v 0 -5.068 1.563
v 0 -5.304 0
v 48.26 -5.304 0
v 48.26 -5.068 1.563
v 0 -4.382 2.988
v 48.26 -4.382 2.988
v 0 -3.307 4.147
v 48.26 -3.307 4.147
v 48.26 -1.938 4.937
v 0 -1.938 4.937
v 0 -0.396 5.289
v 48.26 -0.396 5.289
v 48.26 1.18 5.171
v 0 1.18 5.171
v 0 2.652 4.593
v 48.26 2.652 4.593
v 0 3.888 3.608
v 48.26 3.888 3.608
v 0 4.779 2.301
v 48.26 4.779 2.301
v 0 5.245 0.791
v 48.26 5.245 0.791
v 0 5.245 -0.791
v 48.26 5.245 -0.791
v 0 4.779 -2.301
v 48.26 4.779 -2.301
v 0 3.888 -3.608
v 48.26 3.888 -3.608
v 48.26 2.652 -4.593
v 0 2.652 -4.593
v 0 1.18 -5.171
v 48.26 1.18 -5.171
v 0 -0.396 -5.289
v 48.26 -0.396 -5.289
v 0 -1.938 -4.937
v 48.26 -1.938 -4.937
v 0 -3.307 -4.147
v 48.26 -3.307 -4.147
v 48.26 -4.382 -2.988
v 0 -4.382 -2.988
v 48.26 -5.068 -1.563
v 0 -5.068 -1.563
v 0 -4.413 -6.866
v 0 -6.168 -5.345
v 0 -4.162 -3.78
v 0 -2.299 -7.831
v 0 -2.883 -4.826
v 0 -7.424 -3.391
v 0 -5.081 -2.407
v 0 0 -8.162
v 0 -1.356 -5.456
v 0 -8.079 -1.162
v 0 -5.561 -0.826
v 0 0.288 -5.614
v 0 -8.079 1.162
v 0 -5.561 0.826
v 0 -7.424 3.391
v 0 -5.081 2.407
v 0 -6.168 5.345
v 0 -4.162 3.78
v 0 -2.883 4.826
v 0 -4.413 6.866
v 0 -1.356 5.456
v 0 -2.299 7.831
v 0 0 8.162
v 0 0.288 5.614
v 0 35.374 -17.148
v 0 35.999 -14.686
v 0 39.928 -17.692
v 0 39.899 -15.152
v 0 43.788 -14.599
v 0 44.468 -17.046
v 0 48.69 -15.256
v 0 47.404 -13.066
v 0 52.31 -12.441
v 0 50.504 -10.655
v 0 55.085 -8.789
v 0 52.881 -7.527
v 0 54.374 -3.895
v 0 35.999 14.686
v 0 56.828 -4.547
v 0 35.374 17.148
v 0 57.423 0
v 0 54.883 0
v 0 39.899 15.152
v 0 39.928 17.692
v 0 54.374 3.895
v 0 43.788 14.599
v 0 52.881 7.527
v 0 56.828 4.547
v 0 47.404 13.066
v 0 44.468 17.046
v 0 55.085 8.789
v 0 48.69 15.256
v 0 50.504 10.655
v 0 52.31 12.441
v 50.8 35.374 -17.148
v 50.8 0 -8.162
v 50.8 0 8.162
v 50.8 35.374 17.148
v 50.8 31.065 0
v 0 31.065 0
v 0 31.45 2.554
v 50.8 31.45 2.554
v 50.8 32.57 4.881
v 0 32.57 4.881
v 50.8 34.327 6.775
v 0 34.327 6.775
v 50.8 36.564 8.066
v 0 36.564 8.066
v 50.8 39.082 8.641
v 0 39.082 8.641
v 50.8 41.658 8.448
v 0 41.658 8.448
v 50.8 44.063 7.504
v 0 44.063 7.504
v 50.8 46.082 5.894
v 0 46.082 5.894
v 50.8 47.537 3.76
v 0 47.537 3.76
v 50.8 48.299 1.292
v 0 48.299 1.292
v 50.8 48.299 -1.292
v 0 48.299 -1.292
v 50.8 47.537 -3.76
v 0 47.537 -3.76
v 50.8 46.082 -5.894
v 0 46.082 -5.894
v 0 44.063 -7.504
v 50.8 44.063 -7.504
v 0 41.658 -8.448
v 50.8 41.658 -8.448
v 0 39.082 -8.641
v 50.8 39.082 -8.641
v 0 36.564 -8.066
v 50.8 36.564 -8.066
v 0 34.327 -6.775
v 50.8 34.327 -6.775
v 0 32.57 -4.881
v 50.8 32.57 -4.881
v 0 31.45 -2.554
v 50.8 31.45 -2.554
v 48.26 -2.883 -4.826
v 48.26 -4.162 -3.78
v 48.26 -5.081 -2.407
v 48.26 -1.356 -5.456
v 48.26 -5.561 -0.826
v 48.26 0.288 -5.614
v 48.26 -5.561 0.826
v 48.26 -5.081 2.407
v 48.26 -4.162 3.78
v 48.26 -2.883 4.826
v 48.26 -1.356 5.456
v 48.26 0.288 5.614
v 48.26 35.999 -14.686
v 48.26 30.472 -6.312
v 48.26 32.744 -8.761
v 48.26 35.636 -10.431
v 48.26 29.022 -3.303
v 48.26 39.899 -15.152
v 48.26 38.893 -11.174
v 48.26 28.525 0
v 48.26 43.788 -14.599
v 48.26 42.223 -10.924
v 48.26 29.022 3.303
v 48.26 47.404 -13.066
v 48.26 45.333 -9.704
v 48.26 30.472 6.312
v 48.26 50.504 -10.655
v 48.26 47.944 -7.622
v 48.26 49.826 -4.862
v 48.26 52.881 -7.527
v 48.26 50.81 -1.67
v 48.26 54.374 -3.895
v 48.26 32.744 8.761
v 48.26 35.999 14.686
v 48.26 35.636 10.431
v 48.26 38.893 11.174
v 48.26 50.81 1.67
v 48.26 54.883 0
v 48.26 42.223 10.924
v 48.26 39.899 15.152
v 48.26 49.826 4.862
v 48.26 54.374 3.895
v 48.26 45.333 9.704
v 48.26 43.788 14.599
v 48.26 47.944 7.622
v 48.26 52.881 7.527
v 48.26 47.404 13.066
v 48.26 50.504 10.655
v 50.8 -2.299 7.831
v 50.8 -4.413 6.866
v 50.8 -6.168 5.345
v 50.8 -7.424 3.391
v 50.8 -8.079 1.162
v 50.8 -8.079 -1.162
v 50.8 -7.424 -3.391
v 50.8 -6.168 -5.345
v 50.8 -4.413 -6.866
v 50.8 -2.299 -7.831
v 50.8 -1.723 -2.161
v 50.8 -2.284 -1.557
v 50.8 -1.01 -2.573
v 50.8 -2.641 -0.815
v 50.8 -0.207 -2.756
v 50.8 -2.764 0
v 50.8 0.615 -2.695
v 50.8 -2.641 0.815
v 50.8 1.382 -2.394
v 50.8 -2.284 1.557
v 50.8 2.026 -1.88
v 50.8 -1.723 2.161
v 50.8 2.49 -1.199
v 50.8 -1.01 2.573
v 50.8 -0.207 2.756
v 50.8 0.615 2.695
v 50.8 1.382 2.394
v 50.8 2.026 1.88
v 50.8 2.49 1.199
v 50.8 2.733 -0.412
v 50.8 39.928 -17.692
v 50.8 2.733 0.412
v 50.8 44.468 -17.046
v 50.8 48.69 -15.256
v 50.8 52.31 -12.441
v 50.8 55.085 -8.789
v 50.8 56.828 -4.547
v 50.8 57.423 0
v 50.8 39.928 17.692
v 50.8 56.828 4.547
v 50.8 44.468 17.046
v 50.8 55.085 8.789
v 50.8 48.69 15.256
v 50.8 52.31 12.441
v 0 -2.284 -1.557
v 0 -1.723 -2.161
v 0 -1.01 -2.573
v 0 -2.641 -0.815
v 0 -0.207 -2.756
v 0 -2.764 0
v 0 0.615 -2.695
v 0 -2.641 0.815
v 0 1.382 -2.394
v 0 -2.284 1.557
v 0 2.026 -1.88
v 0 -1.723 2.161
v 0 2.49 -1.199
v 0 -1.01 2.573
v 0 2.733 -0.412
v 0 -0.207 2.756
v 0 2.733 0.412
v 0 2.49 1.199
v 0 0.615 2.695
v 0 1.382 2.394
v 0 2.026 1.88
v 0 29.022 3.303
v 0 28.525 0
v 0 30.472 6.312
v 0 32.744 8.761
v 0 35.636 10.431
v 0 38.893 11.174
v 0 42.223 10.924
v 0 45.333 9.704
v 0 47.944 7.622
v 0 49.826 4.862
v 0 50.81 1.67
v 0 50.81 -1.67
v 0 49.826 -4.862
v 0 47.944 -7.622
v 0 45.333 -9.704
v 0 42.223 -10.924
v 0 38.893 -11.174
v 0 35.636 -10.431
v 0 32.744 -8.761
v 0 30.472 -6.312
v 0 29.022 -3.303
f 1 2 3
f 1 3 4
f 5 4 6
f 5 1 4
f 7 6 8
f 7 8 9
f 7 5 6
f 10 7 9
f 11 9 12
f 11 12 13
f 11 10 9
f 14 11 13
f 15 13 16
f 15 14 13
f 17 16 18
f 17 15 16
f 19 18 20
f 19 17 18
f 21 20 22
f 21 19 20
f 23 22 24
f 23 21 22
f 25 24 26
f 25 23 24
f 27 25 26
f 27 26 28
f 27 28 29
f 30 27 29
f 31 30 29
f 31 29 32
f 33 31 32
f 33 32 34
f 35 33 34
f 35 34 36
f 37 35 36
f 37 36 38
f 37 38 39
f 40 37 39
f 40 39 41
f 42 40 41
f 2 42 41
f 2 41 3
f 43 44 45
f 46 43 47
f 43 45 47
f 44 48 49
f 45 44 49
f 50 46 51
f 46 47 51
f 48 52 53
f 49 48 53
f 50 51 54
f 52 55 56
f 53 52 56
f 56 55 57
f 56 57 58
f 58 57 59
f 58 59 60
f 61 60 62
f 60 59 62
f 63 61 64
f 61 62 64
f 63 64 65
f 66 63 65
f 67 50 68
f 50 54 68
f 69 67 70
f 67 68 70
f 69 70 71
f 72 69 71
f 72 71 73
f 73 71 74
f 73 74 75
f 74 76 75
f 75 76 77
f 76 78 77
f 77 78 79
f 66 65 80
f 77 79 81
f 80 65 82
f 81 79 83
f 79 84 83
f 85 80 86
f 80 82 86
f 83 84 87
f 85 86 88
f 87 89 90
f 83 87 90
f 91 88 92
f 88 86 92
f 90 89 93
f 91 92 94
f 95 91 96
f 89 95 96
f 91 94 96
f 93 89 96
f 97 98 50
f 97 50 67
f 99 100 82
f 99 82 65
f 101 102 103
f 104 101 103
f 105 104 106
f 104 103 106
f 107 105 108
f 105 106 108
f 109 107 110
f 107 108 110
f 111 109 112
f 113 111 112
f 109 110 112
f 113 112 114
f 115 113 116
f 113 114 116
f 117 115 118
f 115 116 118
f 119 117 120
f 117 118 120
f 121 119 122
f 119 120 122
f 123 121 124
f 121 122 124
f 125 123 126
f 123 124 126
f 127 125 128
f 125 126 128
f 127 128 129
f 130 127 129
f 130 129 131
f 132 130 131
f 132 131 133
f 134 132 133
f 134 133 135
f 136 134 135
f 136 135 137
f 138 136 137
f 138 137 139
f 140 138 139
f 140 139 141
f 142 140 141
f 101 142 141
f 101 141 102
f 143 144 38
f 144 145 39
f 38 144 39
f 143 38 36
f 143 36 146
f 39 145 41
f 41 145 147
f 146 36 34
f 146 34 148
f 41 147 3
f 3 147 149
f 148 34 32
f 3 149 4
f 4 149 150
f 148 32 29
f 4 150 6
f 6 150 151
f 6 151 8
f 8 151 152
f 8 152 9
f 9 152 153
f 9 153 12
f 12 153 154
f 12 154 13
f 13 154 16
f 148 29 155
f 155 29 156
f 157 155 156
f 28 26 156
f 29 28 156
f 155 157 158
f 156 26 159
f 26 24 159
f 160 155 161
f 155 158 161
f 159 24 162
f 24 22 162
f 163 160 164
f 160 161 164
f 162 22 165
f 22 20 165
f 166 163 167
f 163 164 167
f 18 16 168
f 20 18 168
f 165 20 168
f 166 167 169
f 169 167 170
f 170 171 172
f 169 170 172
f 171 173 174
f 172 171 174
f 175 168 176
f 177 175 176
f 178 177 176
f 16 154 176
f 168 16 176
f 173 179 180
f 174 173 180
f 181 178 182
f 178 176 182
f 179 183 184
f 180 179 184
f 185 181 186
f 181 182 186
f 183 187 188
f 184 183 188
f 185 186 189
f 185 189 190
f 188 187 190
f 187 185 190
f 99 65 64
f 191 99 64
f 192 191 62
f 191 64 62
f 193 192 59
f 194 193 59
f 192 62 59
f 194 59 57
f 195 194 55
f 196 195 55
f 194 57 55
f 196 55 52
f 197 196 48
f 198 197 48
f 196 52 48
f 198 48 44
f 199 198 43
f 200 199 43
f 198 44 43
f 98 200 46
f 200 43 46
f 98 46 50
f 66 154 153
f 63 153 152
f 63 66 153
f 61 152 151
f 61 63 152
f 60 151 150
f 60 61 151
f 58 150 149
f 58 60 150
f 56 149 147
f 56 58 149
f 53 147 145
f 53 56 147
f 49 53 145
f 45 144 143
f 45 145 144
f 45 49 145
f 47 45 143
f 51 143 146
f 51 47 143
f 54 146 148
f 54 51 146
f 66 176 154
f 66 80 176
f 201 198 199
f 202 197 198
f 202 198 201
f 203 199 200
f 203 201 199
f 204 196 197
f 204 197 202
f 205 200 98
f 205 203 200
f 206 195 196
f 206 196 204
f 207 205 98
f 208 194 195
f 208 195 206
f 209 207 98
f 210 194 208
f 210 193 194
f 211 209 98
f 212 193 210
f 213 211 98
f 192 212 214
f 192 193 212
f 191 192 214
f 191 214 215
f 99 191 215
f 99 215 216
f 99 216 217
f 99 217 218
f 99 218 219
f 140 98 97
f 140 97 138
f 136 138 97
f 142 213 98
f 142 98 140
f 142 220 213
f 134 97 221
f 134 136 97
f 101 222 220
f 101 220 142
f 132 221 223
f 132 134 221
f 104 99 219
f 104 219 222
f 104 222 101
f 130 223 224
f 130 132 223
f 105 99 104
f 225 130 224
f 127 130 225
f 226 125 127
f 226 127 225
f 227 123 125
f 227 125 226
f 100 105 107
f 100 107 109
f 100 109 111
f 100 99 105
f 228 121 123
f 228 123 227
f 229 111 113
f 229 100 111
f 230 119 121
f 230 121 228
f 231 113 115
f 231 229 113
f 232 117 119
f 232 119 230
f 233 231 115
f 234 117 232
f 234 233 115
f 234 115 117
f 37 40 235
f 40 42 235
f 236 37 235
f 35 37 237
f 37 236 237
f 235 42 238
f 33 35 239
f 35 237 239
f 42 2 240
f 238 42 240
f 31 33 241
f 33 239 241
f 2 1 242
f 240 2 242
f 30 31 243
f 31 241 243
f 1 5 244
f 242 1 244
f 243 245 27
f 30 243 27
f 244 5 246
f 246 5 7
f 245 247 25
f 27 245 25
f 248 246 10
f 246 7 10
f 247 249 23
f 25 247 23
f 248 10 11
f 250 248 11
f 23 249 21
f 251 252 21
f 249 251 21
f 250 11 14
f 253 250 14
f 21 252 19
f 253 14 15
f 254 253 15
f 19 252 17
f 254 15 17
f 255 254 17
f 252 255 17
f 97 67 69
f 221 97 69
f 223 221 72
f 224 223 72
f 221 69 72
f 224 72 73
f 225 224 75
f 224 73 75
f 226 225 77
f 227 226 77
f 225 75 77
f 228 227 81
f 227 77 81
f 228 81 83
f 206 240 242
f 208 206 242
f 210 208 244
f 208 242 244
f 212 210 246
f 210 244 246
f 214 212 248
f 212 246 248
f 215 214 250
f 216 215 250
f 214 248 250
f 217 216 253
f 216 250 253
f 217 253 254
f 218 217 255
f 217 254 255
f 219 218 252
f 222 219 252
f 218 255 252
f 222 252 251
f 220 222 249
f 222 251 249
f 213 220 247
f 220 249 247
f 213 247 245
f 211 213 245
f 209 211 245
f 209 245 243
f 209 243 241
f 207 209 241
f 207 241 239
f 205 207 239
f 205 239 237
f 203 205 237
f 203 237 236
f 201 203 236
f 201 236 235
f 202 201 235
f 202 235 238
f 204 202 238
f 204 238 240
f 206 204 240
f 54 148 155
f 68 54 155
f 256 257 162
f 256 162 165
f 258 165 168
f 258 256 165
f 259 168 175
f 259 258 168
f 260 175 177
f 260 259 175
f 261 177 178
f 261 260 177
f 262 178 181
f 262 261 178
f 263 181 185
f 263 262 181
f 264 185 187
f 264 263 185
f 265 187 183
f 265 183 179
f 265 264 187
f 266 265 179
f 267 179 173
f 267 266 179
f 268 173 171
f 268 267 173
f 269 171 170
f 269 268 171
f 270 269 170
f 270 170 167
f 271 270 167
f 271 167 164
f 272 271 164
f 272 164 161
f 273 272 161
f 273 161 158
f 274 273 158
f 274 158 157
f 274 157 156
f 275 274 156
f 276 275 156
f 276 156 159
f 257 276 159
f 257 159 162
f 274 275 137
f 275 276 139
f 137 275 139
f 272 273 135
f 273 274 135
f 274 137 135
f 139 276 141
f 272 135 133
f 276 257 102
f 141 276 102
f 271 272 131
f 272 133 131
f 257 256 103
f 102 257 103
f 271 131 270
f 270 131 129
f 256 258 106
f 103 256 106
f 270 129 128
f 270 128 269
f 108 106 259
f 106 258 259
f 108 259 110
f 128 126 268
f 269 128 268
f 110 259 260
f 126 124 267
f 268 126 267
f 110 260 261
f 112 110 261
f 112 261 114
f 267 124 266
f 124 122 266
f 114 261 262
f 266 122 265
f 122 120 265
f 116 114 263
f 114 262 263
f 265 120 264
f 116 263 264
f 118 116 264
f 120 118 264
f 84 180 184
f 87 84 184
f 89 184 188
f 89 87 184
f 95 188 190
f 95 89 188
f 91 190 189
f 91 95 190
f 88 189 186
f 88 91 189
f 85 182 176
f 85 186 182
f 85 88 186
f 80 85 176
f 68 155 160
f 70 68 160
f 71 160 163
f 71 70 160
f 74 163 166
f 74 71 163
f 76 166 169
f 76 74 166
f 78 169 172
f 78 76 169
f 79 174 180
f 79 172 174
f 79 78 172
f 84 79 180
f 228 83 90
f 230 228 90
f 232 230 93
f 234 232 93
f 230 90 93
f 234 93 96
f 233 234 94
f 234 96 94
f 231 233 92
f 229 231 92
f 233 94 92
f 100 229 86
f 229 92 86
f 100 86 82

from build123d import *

# Parameters (mm, degrees)
F1_DEPTH = 50.8
F2_R     = 2.7639393044
F2_R_2   = 8.6653307134
F3_DEPTH = 79.502
F4_T     = -2.54


with BuildPart() as f1:
    # F0 (on Right) → F1 (new body)
    with BuildSketch(Plane.YZ):
        with BuildLine():
            ThreePointArc((0, -8.1618588303), (5.771305726, -5.771305726), (8.1618588303, 0))
            ThreePointArc((8.1618588303, 0), (5.771305726, 5.771305726), (0, 8.1618588303))
            ThreePointArc((0, 8.1618588303), (-8.1618588303, 0), (0, -8.1618588303))
        make_face()
        with BuildLine():
            ThreePointArc((57.4225941824, 0), (50.5917612932, 13.9660503324), (35.3738057369, 17.1479787622))
            ThreePointArc((35.3738057369, 17.1479787622), (22.0373280273, 0), (35.3738057369, -17.1479787622))
            ThreePointArc((35.3738057369, -17.1479787622), (50.5917612932, -13.9660503324), (57.4225941824, 0))
        make_face()
        with BuildLine():
            ThreePointArc((0, 8.1618588303), (5.771305726, 5.771305726), (8.1618588303, 0))
            ThreePointArc((8.1618588303, 0), (5.771305726, -5.771305726), (0, -8.1618588303))
            Line((0, -8.1618588303), (35.3738057369, -17.1479787622))
            ThreePointArc((35.3738057369, -17.1479787622), (22.0373280273, 0), (35.3738057369, 17.1479787622))
            Line((35.3738057369, 17.1479787622), (0, 8.1618588303))
        make_face()
    extrude(amount=F1_DEPTH)

    # F2 (on face) → F3 (cut)
    with BuildSketch(Plane(origin=(0, 0, 0), x_dir=(0, -1, 0), z_dir=(-1, 0, 0))):
        Circle(F2_R)
        with Locations((-39.7299611049, 0)):
            Circle(F2_R_2)
    extrude(amount=-F3_DEPTH, mode=Mode.SUBTRACT)

    # F4
    f4_openings = [f1.faces().sort_by_distance(p)[0] for p in [
        (0, 26.679648, 0),
    ]]
    offset(amount=F4_T, openings=f4_openings, kind=Kind.INTERSECTION)


solid = f1.part
